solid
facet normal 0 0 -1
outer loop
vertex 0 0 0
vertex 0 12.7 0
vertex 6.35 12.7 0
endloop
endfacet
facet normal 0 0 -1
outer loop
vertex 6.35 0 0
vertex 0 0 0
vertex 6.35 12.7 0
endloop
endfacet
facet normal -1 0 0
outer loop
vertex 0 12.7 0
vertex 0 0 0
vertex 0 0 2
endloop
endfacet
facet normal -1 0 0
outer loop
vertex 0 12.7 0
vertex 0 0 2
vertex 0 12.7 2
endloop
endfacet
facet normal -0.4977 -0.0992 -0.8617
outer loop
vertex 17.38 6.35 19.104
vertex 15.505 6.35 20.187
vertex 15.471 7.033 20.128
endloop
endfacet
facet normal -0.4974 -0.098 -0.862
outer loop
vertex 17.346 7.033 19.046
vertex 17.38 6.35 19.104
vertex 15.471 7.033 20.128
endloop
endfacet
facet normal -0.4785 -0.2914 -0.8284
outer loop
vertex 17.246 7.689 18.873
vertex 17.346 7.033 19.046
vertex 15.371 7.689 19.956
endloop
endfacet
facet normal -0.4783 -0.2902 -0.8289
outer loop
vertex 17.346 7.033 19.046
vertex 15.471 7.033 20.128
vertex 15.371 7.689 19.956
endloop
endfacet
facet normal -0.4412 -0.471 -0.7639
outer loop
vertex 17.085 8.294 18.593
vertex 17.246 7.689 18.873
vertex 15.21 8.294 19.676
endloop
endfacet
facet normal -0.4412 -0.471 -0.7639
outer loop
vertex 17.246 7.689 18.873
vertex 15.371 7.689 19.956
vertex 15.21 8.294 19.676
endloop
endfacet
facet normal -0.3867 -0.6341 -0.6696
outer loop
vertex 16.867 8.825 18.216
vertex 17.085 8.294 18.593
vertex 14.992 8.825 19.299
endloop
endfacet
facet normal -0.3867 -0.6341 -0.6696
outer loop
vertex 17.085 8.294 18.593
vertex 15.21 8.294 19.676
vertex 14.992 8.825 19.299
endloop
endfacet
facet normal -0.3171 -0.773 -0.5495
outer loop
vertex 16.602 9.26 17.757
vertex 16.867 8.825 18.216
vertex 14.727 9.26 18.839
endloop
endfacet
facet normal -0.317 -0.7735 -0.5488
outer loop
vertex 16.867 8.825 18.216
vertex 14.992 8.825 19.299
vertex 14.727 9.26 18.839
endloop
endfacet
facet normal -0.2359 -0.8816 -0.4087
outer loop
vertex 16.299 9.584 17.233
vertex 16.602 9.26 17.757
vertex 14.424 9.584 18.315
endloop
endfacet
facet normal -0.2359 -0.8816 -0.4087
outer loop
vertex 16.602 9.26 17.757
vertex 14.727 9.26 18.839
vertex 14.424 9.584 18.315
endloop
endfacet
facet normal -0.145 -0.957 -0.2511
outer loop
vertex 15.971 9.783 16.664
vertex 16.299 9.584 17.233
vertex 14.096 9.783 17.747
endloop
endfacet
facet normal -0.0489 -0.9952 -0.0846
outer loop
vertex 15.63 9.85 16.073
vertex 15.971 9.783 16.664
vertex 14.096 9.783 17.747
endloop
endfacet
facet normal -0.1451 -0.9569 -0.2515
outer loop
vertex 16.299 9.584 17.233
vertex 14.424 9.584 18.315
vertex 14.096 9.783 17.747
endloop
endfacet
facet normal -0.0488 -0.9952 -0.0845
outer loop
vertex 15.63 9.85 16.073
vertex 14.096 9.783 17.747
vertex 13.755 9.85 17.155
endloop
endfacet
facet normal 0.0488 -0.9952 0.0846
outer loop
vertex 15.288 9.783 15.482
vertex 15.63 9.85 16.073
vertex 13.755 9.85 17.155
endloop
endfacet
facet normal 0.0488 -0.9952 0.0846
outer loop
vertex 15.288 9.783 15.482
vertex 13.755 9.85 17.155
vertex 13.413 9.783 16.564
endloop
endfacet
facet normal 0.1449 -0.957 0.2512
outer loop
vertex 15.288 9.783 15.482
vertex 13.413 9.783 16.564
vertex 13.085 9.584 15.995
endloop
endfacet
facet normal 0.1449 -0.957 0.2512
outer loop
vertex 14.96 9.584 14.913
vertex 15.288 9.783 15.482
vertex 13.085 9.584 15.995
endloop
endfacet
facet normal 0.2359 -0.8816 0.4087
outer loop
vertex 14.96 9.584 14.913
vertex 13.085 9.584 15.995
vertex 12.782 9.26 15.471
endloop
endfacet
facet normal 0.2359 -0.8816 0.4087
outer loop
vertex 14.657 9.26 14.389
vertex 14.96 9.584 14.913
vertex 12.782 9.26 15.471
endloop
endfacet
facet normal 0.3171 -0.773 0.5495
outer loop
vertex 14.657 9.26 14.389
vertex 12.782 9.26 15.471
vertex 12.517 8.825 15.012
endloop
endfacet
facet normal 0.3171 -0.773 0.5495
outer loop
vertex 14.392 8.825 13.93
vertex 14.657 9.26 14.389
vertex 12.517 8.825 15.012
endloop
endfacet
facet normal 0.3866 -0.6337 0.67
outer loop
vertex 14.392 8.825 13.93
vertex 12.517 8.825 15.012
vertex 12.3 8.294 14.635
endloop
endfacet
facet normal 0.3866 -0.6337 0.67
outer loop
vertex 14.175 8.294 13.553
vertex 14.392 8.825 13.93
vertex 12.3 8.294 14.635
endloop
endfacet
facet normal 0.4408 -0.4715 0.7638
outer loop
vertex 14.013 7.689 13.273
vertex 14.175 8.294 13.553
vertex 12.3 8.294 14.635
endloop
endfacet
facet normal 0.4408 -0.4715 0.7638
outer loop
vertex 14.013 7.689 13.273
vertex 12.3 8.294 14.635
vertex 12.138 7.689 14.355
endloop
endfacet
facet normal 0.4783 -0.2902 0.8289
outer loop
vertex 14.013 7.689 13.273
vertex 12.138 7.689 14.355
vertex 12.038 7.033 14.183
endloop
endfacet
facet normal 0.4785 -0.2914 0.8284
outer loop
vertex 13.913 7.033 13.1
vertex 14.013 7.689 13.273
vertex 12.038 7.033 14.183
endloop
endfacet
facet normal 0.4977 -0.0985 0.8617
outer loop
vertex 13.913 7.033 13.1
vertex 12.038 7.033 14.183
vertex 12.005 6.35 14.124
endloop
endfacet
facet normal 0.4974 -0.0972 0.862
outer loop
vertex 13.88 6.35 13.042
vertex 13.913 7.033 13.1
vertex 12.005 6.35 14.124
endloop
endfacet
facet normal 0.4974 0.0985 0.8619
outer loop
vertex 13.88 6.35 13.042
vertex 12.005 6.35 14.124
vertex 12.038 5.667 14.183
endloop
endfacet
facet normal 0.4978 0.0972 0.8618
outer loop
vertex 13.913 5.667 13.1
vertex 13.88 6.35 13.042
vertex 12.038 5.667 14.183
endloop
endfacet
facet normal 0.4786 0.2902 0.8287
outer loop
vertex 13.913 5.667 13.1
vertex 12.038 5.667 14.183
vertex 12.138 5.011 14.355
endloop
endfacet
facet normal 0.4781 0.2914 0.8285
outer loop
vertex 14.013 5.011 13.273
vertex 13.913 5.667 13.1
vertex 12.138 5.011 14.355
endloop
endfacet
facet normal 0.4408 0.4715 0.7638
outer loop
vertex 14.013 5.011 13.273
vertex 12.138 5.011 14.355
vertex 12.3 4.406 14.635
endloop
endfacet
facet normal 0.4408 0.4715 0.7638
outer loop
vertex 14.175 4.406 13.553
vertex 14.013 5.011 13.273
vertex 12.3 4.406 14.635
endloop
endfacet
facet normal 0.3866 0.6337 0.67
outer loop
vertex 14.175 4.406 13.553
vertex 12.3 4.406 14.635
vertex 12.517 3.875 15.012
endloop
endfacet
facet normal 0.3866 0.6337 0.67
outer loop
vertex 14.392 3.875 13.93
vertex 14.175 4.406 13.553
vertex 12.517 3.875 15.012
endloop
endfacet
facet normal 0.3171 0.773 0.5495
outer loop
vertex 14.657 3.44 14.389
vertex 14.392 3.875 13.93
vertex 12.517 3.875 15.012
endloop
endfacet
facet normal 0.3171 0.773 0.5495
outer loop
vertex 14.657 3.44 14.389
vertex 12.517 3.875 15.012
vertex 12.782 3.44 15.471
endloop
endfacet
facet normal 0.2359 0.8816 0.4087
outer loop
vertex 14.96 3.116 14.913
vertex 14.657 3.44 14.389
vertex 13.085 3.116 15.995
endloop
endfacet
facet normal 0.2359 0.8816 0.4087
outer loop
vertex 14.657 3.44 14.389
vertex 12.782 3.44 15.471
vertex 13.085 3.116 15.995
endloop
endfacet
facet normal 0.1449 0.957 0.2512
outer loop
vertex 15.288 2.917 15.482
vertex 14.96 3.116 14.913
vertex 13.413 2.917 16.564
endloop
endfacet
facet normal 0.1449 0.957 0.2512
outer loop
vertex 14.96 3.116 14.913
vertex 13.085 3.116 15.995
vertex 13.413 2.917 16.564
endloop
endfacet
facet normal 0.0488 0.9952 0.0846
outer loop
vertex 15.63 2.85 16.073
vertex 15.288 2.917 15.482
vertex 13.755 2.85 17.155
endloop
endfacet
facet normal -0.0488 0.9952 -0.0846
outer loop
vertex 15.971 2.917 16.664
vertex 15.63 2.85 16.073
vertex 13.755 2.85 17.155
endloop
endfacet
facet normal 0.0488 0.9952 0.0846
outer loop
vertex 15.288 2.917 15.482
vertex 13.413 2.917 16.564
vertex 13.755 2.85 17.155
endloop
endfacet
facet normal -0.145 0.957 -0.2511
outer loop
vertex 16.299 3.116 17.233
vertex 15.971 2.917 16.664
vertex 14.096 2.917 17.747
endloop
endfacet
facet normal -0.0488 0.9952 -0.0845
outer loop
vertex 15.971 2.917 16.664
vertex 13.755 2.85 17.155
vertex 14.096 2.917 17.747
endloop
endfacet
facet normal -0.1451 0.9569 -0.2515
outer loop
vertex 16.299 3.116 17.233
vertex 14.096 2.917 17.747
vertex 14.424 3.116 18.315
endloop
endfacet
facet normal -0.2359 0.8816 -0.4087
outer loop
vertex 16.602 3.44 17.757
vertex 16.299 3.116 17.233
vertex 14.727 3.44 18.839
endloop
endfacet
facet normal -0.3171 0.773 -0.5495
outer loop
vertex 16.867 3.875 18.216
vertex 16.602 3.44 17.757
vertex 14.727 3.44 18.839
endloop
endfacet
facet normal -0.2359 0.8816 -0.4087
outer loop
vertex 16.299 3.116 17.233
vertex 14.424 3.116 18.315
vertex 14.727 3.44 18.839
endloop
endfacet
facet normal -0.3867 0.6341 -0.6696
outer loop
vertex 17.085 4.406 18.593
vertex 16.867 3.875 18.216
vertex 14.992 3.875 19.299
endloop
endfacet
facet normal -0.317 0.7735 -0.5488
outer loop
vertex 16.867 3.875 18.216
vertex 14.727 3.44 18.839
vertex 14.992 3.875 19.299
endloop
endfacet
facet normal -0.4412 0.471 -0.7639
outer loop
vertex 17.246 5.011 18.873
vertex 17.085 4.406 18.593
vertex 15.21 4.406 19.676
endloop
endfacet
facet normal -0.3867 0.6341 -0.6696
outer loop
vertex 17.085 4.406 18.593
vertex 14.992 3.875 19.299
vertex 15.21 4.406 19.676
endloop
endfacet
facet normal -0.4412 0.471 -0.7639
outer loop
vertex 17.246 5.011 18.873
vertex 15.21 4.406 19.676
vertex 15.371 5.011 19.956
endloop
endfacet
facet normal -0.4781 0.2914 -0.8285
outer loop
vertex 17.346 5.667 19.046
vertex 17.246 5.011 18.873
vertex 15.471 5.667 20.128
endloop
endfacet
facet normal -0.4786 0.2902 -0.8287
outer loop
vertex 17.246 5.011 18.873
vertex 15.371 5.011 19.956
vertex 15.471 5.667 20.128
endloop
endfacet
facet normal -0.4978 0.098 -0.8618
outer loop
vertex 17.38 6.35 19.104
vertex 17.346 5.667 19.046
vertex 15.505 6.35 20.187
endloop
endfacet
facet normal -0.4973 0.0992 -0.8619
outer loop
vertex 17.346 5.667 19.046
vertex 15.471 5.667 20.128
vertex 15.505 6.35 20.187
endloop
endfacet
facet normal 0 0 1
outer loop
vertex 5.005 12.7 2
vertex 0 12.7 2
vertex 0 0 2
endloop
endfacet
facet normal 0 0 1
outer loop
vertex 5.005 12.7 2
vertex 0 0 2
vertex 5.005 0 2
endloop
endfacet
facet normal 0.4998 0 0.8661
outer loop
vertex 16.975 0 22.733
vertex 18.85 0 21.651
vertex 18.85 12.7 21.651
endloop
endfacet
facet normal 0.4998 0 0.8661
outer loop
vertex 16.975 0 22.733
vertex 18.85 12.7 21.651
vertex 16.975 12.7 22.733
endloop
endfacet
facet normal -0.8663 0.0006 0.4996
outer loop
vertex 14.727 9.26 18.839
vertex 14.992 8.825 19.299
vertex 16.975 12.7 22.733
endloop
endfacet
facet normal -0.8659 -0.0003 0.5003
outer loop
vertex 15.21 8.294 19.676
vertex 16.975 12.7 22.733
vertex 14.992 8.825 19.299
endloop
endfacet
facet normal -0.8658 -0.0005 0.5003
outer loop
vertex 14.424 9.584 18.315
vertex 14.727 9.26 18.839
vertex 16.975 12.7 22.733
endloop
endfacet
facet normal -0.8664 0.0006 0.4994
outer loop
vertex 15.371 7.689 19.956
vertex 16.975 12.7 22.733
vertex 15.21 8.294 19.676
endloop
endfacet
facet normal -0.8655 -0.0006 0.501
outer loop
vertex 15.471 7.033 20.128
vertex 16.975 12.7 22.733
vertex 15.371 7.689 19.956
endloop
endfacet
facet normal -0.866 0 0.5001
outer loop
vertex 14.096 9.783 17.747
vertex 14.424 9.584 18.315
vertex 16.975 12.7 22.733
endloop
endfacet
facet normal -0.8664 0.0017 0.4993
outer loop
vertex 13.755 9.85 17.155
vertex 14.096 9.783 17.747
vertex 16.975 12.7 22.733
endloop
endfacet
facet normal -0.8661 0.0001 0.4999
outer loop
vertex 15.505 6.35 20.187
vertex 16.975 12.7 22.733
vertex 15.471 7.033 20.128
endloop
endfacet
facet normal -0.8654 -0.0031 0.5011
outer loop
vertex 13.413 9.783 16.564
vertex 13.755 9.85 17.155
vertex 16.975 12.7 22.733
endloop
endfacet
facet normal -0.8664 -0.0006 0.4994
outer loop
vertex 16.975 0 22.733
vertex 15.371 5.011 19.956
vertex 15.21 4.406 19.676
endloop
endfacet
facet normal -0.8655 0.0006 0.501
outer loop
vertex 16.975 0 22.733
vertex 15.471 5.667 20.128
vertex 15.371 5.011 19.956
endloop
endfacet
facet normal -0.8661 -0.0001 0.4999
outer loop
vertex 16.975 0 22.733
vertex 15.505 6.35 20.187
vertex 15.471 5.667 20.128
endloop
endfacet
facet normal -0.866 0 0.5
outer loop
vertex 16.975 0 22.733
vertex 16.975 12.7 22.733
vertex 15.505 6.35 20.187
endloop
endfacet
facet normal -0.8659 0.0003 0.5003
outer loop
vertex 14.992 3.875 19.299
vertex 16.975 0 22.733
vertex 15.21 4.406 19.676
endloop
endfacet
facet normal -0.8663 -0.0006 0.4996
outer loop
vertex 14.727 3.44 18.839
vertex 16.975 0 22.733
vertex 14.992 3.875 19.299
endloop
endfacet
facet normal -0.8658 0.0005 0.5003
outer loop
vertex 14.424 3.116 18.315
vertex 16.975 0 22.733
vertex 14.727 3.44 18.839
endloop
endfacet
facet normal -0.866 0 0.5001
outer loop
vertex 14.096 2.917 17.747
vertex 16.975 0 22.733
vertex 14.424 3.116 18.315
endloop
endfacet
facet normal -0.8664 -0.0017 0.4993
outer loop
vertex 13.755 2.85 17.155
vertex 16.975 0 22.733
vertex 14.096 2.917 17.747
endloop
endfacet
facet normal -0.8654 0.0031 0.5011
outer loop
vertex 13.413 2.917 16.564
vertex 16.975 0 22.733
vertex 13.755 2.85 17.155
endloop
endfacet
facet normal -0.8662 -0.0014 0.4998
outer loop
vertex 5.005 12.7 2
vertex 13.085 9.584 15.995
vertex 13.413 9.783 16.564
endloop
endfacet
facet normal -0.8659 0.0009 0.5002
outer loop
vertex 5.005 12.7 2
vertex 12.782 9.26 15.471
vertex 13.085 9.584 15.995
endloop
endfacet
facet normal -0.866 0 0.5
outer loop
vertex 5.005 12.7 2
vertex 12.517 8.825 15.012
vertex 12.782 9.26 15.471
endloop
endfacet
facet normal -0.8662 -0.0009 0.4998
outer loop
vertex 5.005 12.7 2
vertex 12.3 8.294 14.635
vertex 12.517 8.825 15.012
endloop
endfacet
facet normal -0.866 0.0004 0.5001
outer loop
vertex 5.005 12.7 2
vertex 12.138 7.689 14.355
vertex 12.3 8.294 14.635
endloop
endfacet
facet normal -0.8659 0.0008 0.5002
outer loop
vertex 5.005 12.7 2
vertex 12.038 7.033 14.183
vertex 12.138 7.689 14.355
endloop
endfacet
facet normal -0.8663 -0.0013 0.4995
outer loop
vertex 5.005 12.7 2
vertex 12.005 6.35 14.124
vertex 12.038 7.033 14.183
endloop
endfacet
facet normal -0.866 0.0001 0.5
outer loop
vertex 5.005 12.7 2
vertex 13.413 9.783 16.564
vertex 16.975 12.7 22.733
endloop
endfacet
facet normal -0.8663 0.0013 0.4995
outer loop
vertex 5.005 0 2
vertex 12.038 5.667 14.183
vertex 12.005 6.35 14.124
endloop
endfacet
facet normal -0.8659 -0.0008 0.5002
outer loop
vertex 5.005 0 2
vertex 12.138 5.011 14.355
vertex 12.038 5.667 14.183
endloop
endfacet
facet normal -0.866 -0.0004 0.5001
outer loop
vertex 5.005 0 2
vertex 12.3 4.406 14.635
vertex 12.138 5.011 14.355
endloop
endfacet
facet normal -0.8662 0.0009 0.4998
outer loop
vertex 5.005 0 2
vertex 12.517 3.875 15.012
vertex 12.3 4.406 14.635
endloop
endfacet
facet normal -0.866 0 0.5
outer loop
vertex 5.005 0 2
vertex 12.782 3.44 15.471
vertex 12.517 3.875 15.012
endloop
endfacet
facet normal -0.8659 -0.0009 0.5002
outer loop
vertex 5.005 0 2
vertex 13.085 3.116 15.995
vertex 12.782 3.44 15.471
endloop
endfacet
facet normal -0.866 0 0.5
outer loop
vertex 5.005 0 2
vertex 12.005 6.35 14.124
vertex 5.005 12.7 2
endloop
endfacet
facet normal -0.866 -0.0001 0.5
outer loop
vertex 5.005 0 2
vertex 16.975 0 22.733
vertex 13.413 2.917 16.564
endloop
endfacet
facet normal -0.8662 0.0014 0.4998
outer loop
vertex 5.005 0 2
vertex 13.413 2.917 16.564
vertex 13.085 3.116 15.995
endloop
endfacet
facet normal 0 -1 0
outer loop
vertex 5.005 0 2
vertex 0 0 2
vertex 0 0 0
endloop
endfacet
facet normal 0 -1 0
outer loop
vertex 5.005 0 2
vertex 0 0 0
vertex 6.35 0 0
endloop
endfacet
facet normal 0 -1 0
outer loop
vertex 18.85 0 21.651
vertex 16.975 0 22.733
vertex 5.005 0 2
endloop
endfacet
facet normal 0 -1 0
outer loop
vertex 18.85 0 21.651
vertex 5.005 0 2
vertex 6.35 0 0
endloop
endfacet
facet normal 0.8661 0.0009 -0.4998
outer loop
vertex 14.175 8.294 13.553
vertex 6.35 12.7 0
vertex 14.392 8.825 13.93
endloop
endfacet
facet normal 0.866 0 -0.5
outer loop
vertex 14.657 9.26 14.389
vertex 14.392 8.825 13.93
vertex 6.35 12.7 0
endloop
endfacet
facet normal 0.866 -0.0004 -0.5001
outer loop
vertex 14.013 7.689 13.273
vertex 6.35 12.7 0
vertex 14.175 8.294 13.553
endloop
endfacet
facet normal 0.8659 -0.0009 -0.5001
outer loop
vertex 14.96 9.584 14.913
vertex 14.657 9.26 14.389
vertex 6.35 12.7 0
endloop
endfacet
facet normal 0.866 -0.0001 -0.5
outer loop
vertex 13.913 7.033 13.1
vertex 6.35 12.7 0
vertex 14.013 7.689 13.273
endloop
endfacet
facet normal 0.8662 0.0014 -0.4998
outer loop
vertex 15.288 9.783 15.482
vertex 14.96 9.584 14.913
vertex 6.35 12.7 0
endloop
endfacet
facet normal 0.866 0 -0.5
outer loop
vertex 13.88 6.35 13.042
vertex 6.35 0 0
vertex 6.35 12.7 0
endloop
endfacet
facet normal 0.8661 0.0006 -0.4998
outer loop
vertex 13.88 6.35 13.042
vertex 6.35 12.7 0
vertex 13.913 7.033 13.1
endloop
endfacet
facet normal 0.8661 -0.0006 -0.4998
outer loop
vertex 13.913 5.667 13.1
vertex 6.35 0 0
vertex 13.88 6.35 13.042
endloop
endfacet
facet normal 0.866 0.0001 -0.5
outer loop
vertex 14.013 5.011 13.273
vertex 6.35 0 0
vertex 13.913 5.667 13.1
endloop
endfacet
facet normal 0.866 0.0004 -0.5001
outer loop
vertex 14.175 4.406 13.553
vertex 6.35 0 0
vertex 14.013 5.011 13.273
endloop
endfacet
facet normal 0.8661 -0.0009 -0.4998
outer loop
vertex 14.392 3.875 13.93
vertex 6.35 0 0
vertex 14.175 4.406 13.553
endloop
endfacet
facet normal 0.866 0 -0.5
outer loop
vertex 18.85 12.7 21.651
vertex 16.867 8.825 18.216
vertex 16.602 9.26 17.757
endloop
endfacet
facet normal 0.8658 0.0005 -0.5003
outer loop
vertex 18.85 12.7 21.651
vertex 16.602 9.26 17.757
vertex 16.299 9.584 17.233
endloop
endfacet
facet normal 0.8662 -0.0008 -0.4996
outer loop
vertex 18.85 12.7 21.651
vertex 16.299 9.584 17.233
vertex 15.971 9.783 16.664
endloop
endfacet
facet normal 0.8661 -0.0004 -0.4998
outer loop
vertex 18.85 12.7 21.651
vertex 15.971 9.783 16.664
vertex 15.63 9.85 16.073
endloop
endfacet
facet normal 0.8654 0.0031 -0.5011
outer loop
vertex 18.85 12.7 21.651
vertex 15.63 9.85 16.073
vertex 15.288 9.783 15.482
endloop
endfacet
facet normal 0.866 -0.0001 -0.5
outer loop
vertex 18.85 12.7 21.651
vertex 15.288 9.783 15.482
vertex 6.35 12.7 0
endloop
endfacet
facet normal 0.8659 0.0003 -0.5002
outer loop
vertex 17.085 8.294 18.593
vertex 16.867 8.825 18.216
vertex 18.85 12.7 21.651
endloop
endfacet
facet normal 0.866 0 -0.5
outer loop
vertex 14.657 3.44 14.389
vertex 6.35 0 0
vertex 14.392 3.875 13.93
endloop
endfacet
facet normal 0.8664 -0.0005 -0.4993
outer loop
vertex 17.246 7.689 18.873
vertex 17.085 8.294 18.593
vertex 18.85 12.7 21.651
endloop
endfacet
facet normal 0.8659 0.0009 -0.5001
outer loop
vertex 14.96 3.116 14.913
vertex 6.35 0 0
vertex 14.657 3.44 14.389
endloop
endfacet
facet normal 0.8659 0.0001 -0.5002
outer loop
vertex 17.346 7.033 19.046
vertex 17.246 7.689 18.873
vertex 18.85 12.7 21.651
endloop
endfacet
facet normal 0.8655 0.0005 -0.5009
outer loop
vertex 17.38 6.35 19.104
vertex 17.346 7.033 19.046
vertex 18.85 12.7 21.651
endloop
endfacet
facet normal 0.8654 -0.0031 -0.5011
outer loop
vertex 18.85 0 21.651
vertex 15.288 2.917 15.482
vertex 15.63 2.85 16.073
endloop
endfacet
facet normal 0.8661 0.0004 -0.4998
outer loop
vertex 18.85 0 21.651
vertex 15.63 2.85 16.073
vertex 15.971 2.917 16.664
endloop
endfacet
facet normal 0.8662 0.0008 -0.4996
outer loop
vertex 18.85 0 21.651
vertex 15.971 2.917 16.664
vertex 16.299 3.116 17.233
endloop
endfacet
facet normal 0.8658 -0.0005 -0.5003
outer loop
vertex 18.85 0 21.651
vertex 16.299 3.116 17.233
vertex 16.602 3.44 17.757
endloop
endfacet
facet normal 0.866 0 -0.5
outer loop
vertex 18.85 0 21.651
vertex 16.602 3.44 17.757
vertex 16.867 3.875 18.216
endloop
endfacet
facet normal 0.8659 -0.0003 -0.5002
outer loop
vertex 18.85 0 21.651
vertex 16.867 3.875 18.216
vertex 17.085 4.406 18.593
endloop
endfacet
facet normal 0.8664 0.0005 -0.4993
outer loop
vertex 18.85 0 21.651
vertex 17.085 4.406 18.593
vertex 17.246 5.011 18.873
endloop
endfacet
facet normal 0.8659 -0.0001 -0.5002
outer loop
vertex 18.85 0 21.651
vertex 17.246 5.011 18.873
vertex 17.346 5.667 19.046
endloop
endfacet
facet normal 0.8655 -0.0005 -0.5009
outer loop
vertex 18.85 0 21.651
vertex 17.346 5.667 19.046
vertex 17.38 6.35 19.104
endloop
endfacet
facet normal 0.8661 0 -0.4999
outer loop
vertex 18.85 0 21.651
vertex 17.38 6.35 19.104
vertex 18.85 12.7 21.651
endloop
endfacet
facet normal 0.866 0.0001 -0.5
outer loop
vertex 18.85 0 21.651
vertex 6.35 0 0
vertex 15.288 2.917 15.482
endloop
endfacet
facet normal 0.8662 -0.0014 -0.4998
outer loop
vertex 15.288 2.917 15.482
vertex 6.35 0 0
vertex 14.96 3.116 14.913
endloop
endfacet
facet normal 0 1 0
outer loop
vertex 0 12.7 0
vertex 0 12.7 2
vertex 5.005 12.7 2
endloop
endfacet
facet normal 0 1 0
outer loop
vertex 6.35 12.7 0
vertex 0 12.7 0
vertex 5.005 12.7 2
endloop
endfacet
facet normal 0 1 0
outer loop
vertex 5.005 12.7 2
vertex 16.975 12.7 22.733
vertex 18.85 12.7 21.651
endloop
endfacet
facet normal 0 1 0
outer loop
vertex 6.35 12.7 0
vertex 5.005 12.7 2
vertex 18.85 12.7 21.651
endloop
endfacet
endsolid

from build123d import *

# Parameters (mm, degrees)
SKETCH1_W           = 6.35
SKETCH1_H           = 12.7
BOSS_EXTRUDE1_DEPTH = 2
BOSS_EXTRUDE2_DEPTH = 12.7
SKETCH3_R           = 3.5
CUT_EXTRUDE1_DEPTH  = 13.990381057


with BuildPart() as part:
    # Sketch1 → Boss-Extrude1 (new body)
    with BuildSketch(Plane.XY):
        with Locations((3.175, 6.35)):
            Rectangle(SKETCH1_W, SKETCH1_H)
    extrude(amount=BOSS_EXTRUDE1_DEPTH)

    # Sketch2 → Boss-Extrude2 (add)
    with BuildSketch(Plane.XZ):
        Polygon((6.35, 0), (18.85, 21.650635095), (16.975, 22.733166849), (3.85, 0), align=None)
    extrude(amount=-BOSS_EXTRUDE2_DEPTH)

    # Sketch3 → Cut-Extrude1 (cut, through all)
    with BuildSketch(Plane(origin=(2.8875, 0, -1.667098902), x_dir=(0.5, 0, 0.866025404), z_dir=(-0.866025404, 0, 0.5))):
        with Locations((21.734401077, 6.35)):
            Circle(SKETCH3_R)
    extrude(amount=-CUT_EXTRUDE1_DEPTH, mode=Mode.SUBTRACT)


solid = part.part
